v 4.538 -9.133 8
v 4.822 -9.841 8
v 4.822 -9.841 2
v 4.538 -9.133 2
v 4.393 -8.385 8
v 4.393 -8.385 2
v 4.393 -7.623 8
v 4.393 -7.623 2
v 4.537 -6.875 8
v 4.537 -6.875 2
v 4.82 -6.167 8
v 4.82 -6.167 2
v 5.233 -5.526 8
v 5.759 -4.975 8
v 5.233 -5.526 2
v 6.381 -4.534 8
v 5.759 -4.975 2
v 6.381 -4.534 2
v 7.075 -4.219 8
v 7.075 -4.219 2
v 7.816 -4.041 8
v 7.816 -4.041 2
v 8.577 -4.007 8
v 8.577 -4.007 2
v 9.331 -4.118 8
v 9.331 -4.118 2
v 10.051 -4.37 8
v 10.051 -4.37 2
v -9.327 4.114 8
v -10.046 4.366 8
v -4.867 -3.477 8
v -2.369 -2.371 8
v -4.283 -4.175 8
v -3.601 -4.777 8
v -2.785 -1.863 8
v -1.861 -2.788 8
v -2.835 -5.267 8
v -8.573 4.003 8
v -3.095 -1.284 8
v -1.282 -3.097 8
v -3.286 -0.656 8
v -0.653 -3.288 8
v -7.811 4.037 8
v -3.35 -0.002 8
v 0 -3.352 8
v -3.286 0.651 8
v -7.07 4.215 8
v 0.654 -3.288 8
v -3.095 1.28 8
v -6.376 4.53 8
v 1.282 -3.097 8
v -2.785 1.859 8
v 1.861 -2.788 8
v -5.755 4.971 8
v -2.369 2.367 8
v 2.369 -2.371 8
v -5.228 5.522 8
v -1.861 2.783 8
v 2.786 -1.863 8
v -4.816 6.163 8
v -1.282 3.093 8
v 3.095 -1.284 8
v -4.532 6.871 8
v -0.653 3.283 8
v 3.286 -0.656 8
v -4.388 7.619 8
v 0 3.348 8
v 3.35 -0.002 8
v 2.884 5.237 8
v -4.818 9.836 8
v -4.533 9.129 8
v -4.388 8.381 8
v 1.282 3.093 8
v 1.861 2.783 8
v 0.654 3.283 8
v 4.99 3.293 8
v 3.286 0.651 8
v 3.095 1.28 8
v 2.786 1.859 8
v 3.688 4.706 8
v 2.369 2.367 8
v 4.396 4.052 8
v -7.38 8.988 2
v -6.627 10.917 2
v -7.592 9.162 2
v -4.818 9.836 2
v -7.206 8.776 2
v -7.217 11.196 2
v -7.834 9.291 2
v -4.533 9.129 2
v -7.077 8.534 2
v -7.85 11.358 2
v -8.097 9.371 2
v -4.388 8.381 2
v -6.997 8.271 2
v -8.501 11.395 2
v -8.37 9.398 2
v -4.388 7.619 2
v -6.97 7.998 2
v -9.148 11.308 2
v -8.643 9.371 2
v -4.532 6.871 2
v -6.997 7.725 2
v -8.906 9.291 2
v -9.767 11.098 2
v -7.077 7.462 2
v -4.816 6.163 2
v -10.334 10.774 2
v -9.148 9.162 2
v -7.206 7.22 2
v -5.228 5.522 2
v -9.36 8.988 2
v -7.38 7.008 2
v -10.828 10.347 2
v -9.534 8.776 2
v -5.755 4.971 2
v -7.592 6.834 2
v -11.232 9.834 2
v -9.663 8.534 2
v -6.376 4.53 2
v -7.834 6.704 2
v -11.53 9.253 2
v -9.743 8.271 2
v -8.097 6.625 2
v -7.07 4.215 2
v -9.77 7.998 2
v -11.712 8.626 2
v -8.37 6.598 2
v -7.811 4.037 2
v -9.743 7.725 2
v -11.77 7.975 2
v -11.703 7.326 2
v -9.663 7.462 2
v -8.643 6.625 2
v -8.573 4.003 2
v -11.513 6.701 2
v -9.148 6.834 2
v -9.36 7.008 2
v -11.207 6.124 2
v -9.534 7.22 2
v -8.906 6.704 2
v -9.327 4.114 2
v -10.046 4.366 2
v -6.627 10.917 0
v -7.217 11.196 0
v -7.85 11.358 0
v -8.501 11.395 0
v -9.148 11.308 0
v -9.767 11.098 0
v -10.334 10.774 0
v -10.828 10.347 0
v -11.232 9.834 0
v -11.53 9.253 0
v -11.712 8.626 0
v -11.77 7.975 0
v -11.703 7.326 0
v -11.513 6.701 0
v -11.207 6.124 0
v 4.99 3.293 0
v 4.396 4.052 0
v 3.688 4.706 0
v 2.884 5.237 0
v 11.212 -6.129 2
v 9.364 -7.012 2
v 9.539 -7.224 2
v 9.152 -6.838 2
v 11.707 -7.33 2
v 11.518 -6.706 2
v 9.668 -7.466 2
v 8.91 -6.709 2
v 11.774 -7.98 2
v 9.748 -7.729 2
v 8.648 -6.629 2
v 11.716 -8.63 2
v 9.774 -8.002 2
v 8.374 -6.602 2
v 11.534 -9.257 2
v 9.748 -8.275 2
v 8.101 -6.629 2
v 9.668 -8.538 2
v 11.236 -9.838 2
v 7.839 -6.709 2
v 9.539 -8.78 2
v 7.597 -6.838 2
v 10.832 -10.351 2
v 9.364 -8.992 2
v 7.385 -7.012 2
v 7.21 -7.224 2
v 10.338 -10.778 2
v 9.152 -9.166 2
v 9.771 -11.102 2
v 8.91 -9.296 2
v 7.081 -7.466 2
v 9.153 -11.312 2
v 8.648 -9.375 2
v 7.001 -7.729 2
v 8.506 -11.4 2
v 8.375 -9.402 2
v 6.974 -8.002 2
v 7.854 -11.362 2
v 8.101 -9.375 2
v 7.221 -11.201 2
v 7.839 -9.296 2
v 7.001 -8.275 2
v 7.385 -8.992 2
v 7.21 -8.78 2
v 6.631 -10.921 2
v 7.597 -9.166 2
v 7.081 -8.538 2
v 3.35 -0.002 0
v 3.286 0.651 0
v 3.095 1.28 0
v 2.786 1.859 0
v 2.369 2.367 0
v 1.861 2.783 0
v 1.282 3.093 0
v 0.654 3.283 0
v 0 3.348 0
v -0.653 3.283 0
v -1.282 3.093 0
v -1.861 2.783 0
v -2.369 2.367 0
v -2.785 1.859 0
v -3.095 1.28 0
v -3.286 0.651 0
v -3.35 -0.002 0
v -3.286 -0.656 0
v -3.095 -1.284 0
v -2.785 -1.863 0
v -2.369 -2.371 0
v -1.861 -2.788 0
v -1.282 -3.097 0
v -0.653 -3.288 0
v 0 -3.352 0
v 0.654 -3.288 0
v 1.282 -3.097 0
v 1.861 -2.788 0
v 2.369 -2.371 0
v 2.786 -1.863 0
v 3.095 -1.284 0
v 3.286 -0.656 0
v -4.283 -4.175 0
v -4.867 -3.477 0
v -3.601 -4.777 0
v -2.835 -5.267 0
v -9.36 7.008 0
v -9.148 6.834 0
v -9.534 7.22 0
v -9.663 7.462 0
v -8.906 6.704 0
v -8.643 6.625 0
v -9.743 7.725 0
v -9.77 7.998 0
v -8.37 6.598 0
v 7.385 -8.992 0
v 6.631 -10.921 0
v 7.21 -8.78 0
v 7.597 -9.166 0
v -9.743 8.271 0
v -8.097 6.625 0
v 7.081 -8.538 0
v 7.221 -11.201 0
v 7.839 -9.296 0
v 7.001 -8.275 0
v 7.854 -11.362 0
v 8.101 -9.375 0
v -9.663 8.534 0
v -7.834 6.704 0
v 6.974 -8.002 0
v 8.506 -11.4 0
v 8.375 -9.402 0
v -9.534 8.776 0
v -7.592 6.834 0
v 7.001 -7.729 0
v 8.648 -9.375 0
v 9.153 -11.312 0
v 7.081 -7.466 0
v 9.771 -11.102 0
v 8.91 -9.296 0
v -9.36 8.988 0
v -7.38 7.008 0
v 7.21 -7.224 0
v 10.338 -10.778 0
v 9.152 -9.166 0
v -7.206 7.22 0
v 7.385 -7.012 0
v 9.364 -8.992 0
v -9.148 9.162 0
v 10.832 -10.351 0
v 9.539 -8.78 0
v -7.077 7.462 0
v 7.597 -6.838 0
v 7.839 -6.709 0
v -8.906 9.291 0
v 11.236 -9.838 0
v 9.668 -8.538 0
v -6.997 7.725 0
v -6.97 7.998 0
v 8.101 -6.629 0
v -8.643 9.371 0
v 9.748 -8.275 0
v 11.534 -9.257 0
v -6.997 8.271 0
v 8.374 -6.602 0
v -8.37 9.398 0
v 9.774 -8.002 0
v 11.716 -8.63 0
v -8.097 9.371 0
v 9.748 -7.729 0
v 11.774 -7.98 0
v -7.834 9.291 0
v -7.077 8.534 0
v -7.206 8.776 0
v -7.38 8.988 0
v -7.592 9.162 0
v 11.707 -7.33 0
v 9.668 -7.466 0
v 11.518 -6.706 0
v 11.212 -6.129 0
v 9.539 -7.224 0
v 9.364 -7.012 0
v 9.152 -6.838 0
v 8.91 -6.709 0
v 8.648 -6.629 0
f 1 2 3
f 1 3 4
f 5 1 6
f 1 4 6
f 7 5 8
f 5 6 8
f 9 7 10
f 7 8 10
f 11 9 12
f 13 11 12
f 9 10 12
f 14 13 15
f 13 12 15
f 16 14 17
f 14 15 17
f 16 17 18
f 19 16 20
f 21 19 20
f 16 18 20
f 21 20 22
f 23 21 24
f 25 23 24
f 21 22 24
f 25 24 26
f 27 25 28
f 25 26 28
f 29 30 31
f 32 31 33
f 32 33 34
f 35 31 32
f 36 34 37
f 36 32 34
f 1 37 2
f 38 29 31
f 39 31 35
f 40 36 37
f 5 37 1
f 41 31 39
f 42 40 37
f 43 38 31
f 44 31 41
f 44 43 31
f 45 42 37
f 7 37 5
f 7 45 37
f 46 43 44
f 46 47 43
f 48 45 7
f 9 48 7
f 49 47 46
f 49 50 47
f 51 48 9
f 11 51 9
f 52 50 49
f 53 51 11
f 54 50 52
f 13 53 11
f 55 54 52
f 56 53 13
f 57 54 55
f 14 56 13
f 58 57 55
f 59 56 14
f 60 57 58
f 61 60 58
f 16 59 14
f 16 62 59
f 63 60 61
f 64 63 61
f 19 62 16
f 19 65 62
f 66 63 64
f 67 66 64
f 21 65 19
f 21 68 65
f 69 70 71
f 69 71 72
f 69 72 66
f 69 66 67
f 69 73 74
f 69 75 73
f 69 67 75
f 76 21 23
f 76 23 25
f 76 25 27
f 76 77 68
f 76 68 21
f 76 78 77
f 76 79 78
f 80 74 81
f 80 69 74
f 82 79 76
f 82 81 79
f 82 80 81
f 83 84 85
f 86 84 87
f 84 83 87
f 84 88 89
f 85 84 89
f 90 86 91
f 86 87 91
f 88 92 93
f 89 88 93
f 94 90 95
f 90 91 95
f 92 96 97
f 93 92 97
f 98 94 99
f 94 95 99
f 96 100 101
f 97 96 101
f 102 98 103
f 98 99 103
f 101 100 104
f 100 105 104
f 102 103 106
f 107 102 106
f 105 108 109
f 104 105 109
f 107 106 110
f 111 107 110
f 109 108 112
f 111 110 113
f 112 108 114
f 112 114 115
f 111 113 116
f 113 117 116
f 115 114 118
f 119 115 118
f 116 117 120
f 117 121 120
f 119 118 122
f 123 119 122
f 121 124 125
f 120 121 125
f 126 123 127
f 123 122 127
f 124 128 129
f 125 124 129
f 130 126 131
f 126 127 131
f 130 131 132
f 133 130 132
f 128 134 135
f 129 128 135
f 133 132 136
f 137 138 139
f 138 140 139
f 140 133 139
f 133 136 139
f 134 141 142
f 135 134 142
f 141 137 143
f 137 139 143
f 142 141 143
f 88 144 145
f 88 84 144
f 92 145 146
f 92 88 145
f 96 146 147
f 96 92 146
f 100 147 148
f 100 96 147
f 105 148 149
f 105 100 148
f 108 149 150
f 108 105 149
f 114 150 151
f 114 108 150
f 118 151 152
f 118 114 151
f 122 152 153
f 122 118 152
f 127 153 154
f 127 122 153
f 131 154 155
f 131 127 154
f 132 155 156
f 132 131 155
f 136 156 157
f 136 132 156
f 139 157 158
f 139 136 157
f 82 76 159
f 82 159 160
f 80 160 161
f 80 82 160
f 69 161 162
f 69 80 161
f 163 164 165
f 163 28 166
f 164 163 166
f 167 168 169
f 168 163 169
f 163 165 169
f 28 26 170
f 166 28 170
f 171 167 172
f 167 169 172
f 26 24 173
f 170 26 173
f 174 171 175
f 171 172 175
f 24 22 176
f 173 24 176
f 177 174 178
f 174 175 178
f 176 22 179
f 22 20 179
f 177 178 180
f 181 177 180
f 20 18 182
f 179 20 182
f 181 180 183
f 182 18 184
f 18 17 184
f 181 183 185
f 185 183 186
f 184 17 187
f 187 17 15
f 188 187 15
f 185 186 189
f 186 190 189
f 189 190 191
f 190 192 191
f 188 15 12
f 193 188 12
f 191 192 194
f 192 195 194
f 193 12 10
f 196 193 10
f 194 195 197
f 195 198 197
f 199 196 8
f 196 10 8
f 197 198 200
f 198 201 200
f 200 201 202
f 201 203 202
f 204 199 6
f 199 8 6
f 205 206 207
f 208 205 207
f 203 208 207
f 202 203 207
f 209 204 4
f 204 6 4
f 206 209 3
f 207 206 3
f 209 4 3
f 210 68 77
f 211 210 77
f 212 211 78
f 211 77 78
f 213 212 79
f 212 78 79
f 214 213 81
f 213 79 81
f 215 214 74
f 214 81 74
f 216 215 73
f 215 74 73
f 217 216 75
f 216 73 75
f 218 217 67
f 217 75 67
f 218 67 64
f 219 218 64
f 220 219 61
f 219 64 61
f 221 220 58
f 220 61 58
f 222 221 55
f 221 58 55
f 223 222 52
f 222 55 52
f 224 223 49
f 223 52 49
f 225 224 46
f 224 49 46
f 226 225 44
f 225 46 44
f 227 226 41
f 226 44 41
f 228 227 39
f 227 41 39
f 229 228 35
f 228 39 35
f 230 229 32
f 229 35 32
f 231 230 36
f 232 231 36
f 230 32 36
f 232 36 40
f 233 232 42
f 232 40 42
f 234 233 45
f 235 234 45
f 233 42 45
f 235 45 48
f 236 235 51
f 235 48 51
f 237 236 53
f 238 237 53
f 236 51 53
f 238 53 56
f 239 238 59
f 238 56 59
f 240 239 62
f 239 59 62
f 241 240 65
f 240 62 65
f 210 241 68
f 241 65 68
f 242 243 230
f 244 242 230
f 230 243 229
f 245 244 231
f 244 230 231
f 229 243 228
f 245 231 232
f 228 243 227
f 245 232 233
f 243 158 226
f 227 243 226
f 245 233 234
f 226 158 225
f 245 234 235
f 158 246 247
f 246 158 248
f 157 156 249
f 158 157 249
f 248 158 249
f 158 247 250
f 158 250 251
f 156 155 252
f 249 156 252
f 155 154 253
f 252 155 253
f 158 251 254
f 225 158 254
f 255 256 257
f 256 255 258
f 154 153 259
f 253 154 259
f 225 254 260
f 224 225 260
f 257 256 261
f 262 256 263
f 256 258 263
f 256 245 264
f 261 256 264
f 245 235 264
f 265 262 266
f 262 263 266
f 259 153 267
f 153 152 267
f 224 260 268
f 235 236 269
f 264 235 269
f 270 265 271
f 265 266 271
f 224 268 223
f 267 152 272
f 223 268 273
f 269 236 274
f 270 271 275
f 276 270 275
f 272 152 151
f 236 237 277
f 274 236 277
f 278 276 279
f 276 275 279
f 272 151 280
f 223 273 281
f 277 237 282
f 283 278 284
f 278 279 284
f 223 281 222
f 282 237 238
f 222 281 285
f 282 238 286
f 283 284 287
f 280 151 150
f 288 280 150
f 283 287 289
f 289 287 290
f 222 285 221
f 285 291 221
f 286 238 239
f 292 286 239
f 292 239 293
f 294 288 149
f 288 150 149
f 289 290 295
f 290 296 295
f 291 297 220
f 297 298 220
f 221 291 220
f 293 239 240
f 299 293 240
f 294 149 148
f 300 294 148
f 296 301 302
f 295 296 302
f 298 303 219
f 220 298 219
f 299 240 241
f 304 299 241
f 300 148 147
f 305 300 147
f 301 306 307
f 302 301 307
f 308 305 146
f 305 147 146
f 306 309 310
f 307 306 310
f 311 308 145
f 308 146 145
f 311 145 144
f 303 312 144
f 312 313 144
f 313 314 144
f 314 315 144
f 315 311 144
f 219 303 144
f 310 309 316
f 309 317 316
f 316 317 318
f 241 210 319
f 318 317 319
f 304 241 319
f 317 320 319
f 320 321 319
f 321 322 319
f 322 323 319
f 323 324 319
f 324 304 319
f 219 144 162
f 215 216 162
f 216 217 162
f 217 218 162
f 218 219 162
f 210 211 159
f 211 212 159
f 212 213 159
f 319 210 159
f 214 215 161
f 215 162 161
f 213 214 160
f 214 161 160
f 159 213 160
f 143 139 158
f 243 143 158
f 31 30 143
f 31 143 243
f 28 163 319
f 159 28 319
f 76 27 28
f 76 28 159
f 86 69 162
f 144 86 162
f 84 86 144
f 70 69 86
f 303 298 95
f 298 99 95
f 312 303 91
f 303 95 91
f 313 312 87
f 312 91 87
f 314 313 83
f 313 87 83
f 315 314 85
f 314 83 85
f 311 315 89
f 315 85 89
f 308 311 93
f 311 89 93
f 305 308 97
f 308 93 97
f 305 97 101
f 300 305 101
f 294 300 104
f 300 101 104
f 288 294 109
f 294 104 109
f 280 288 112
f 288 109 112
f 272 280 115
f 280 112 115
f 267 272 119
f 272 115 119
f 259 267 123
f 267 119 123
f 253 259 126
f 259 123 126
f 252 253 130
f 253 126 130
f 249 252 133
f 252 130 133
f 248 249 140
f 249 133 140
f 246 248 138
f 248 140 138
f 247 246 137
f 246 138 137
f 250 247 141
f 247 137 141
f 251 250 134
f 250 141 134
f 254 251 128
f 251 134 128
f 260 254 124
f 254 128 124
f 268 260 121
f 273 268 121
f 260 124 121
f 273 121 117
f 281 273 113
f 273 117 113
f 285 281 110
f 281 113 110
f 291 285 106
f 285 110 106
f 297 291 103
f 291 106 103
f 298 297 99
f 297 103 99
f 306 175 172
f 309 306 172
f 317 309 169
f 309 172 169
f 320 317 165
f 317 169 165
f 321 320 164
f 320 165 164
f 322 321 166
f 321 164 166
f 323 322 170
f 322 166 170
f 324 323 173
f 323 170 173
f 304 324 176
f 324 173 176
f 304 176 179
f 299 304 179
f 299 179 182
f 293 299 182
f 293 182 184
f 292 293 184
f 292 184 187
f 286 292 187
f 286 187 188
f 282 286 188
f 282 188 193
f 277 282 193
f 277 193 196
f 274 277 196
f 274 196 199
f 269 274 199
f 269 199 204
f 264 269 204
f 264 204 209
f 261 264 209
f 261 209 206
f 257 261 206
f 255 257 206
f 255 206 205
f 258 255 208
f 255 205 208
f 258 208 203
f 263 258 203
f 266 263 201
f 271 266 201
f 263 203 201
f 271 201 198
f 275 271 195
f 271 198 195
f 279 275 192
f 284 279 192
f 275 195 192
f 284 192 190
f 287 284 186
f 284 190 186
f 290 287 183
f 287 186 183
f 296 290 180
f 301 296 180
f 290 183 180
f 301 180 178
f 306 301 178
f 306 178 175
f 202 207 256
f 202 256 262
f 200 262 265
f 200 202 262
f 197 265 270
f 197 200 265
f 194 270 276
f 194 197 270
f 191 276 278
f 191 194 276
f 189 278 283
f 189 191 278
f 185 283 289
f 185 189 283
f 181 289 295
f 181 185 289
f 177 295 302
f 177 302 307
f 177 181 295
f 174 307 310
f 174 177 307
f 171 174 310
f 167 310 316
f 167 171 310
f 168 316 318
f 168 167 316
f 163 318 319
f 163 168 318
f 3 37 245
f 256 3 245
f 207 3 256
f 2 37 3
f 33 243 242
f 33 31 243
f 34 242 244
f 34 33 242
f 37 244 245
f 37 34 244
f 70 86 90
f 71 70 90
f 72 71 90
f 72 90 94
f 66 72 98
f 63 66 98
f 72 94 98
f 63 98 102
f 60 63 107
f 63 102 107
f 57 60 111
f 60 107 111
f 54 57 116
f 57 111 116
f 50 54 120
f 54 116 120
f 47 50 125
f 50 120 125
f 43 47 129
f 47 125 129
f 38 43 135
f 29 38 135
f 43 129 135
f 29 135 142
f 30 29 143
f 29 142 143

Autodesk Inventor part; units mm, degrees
ref_plane "YZ Plane" through (0, 0, 0) normal (1, 0, 0) x (0, 1, 0)
ref_plane "XZ Plane" through (0, 0, 0) normal (0, 1, 0) x (-1, 0, 0)
ref_plane "XY Plane" through (0, 0, 0) normal (0, 0, 1) x (1, 0, 0)
sketch "Skizze1" plane through (0, 0, 0) normal (0, 0, 1) x (1, 0, 0)
  circle A0 centre (0.0001, -0.0022) radius 3.9802 projected
  circle A1 centre (-8.37, 7.9978) radius 1.4 projected
  circle A2 centre (8.3745, -8.0022) radius 1.4 projected
  line L0 (-9.5383, 7.2264) -> (-3.2198, -2.3418)
  line L1 (-7.6522, 9.1998) -> (1.8915, 3.4999)
  line L2 (9.5428, -7.2307) -> (3.3215, 2.191)
  line L3 (-1.8517, -3.5253) -> (7.6567, -9.2041)
  point P0 (0, 0)
extrude "Extrusion1" add sketch "Skizze1" along normal blind 8
sketch "Skizze2" plane through (0, 0, 8) normal (0, 0, 1) x (1, 0, 0)
  arc A0 (-7.6522, 9.1998) -> (-9.5383, 7.2264) centre (-8.37, 7.9978) ccw projected
  line L0 (-9.5383, 7.2264) -> (-3.2198, -2.3418) projected
  arc A1 (-3.2198, -2.3418) -> (-1.8517, -3.5253) centre (0.0001, -0.0022) ccw projected
  line L1 (-1.8517, -3.5253) -> (7.6567, -9.2041) projected
  arc A2 (7.6567, -9.2041) -> (9.5428, -7.2307) centre (8.3745, -8.0022) ccw projected
  line L2 (9.5428, -7.2307) -> (3.3215, 2.191) projected
  arc A3 (3.3215, 2.191) -> (1.8915, 3.4999) centre (0.0001, -0.0022) ccw projected
  line L3 (1.8915, 3.4999) -> (-7.6522, 9.1998) projected
  arc A4 (-6.6267, 10.9169) -> (-11.2072, 6.1243) centre (-8.37, 7.9978) ccw
  line L4 (-11.2072, 6.1243) -> (-4.8666, -3.4774)
  arc A5 (-4.8666, -3.4774) -> (-2.8352, -5.2674) centre (0.0001, -0.0022) ccw
  line L5 (-2.8352, -5.2674) -> (6.6312, -10.9212)
  arc A6 (6.6312, -10.9212) -> (11.2118, -6.1287) centre (8.3745, -8.0022) ccw
  line L6 (11.2118, -6.1287) -> (4.9905, 3.2931)
  arc A7 (4.9905, 3.2931) -> (2.8837, 5.2369) centre (0.0001, -0.0022) ccw
  line L7 (2.8837, 5.2369) -> (-6.6267, 10.9169)
  point P0 (0, 0)
  dimension "d2" = 2
extrude "Extrusion2" add sketch "Skizze2" against normal up to surface (8 mm away)
sketch "Skizze3" plane through (0, 0, 8) normal (0, 0, 1) x (1, 0, 0)
  circle A0 centre (0.0001, -0.0022) radius 3.9802 projected
  circle A1 centre (-8.37, 7.9978) radius 1.4 projected
  circle A2 centre (8.3745, -8.0022) radius 1.4 projected
  circle A3 centre (0.0001, -0.0022) radius 3.35
  point P0 (0, 0)
  dimension "d5" = 6.7
extrude "Extrusion3" cut sketch "Skizze3" against normal through all contours A1 | A2 | A3
sketch "Skizze4" plane through (0, 0, 8) normal (0, 0, 1) x (1, 0, 0)
  circle A0 centre (-8.37, 7.9978) radius 1.4 projected
  circle A1 centre (8.3745, -8.0022) radius 1.4 projected
  point P0 (0, 0)
hole "Bohrung1" at (-8.37, 7.9978, 8) at (8.3745, -8.0022, 8) direction (0, 0, -1) diameter 2.8 end through all counterbore diameter 8 counterbore depth 6
properties part number "IM_Lensholder"
